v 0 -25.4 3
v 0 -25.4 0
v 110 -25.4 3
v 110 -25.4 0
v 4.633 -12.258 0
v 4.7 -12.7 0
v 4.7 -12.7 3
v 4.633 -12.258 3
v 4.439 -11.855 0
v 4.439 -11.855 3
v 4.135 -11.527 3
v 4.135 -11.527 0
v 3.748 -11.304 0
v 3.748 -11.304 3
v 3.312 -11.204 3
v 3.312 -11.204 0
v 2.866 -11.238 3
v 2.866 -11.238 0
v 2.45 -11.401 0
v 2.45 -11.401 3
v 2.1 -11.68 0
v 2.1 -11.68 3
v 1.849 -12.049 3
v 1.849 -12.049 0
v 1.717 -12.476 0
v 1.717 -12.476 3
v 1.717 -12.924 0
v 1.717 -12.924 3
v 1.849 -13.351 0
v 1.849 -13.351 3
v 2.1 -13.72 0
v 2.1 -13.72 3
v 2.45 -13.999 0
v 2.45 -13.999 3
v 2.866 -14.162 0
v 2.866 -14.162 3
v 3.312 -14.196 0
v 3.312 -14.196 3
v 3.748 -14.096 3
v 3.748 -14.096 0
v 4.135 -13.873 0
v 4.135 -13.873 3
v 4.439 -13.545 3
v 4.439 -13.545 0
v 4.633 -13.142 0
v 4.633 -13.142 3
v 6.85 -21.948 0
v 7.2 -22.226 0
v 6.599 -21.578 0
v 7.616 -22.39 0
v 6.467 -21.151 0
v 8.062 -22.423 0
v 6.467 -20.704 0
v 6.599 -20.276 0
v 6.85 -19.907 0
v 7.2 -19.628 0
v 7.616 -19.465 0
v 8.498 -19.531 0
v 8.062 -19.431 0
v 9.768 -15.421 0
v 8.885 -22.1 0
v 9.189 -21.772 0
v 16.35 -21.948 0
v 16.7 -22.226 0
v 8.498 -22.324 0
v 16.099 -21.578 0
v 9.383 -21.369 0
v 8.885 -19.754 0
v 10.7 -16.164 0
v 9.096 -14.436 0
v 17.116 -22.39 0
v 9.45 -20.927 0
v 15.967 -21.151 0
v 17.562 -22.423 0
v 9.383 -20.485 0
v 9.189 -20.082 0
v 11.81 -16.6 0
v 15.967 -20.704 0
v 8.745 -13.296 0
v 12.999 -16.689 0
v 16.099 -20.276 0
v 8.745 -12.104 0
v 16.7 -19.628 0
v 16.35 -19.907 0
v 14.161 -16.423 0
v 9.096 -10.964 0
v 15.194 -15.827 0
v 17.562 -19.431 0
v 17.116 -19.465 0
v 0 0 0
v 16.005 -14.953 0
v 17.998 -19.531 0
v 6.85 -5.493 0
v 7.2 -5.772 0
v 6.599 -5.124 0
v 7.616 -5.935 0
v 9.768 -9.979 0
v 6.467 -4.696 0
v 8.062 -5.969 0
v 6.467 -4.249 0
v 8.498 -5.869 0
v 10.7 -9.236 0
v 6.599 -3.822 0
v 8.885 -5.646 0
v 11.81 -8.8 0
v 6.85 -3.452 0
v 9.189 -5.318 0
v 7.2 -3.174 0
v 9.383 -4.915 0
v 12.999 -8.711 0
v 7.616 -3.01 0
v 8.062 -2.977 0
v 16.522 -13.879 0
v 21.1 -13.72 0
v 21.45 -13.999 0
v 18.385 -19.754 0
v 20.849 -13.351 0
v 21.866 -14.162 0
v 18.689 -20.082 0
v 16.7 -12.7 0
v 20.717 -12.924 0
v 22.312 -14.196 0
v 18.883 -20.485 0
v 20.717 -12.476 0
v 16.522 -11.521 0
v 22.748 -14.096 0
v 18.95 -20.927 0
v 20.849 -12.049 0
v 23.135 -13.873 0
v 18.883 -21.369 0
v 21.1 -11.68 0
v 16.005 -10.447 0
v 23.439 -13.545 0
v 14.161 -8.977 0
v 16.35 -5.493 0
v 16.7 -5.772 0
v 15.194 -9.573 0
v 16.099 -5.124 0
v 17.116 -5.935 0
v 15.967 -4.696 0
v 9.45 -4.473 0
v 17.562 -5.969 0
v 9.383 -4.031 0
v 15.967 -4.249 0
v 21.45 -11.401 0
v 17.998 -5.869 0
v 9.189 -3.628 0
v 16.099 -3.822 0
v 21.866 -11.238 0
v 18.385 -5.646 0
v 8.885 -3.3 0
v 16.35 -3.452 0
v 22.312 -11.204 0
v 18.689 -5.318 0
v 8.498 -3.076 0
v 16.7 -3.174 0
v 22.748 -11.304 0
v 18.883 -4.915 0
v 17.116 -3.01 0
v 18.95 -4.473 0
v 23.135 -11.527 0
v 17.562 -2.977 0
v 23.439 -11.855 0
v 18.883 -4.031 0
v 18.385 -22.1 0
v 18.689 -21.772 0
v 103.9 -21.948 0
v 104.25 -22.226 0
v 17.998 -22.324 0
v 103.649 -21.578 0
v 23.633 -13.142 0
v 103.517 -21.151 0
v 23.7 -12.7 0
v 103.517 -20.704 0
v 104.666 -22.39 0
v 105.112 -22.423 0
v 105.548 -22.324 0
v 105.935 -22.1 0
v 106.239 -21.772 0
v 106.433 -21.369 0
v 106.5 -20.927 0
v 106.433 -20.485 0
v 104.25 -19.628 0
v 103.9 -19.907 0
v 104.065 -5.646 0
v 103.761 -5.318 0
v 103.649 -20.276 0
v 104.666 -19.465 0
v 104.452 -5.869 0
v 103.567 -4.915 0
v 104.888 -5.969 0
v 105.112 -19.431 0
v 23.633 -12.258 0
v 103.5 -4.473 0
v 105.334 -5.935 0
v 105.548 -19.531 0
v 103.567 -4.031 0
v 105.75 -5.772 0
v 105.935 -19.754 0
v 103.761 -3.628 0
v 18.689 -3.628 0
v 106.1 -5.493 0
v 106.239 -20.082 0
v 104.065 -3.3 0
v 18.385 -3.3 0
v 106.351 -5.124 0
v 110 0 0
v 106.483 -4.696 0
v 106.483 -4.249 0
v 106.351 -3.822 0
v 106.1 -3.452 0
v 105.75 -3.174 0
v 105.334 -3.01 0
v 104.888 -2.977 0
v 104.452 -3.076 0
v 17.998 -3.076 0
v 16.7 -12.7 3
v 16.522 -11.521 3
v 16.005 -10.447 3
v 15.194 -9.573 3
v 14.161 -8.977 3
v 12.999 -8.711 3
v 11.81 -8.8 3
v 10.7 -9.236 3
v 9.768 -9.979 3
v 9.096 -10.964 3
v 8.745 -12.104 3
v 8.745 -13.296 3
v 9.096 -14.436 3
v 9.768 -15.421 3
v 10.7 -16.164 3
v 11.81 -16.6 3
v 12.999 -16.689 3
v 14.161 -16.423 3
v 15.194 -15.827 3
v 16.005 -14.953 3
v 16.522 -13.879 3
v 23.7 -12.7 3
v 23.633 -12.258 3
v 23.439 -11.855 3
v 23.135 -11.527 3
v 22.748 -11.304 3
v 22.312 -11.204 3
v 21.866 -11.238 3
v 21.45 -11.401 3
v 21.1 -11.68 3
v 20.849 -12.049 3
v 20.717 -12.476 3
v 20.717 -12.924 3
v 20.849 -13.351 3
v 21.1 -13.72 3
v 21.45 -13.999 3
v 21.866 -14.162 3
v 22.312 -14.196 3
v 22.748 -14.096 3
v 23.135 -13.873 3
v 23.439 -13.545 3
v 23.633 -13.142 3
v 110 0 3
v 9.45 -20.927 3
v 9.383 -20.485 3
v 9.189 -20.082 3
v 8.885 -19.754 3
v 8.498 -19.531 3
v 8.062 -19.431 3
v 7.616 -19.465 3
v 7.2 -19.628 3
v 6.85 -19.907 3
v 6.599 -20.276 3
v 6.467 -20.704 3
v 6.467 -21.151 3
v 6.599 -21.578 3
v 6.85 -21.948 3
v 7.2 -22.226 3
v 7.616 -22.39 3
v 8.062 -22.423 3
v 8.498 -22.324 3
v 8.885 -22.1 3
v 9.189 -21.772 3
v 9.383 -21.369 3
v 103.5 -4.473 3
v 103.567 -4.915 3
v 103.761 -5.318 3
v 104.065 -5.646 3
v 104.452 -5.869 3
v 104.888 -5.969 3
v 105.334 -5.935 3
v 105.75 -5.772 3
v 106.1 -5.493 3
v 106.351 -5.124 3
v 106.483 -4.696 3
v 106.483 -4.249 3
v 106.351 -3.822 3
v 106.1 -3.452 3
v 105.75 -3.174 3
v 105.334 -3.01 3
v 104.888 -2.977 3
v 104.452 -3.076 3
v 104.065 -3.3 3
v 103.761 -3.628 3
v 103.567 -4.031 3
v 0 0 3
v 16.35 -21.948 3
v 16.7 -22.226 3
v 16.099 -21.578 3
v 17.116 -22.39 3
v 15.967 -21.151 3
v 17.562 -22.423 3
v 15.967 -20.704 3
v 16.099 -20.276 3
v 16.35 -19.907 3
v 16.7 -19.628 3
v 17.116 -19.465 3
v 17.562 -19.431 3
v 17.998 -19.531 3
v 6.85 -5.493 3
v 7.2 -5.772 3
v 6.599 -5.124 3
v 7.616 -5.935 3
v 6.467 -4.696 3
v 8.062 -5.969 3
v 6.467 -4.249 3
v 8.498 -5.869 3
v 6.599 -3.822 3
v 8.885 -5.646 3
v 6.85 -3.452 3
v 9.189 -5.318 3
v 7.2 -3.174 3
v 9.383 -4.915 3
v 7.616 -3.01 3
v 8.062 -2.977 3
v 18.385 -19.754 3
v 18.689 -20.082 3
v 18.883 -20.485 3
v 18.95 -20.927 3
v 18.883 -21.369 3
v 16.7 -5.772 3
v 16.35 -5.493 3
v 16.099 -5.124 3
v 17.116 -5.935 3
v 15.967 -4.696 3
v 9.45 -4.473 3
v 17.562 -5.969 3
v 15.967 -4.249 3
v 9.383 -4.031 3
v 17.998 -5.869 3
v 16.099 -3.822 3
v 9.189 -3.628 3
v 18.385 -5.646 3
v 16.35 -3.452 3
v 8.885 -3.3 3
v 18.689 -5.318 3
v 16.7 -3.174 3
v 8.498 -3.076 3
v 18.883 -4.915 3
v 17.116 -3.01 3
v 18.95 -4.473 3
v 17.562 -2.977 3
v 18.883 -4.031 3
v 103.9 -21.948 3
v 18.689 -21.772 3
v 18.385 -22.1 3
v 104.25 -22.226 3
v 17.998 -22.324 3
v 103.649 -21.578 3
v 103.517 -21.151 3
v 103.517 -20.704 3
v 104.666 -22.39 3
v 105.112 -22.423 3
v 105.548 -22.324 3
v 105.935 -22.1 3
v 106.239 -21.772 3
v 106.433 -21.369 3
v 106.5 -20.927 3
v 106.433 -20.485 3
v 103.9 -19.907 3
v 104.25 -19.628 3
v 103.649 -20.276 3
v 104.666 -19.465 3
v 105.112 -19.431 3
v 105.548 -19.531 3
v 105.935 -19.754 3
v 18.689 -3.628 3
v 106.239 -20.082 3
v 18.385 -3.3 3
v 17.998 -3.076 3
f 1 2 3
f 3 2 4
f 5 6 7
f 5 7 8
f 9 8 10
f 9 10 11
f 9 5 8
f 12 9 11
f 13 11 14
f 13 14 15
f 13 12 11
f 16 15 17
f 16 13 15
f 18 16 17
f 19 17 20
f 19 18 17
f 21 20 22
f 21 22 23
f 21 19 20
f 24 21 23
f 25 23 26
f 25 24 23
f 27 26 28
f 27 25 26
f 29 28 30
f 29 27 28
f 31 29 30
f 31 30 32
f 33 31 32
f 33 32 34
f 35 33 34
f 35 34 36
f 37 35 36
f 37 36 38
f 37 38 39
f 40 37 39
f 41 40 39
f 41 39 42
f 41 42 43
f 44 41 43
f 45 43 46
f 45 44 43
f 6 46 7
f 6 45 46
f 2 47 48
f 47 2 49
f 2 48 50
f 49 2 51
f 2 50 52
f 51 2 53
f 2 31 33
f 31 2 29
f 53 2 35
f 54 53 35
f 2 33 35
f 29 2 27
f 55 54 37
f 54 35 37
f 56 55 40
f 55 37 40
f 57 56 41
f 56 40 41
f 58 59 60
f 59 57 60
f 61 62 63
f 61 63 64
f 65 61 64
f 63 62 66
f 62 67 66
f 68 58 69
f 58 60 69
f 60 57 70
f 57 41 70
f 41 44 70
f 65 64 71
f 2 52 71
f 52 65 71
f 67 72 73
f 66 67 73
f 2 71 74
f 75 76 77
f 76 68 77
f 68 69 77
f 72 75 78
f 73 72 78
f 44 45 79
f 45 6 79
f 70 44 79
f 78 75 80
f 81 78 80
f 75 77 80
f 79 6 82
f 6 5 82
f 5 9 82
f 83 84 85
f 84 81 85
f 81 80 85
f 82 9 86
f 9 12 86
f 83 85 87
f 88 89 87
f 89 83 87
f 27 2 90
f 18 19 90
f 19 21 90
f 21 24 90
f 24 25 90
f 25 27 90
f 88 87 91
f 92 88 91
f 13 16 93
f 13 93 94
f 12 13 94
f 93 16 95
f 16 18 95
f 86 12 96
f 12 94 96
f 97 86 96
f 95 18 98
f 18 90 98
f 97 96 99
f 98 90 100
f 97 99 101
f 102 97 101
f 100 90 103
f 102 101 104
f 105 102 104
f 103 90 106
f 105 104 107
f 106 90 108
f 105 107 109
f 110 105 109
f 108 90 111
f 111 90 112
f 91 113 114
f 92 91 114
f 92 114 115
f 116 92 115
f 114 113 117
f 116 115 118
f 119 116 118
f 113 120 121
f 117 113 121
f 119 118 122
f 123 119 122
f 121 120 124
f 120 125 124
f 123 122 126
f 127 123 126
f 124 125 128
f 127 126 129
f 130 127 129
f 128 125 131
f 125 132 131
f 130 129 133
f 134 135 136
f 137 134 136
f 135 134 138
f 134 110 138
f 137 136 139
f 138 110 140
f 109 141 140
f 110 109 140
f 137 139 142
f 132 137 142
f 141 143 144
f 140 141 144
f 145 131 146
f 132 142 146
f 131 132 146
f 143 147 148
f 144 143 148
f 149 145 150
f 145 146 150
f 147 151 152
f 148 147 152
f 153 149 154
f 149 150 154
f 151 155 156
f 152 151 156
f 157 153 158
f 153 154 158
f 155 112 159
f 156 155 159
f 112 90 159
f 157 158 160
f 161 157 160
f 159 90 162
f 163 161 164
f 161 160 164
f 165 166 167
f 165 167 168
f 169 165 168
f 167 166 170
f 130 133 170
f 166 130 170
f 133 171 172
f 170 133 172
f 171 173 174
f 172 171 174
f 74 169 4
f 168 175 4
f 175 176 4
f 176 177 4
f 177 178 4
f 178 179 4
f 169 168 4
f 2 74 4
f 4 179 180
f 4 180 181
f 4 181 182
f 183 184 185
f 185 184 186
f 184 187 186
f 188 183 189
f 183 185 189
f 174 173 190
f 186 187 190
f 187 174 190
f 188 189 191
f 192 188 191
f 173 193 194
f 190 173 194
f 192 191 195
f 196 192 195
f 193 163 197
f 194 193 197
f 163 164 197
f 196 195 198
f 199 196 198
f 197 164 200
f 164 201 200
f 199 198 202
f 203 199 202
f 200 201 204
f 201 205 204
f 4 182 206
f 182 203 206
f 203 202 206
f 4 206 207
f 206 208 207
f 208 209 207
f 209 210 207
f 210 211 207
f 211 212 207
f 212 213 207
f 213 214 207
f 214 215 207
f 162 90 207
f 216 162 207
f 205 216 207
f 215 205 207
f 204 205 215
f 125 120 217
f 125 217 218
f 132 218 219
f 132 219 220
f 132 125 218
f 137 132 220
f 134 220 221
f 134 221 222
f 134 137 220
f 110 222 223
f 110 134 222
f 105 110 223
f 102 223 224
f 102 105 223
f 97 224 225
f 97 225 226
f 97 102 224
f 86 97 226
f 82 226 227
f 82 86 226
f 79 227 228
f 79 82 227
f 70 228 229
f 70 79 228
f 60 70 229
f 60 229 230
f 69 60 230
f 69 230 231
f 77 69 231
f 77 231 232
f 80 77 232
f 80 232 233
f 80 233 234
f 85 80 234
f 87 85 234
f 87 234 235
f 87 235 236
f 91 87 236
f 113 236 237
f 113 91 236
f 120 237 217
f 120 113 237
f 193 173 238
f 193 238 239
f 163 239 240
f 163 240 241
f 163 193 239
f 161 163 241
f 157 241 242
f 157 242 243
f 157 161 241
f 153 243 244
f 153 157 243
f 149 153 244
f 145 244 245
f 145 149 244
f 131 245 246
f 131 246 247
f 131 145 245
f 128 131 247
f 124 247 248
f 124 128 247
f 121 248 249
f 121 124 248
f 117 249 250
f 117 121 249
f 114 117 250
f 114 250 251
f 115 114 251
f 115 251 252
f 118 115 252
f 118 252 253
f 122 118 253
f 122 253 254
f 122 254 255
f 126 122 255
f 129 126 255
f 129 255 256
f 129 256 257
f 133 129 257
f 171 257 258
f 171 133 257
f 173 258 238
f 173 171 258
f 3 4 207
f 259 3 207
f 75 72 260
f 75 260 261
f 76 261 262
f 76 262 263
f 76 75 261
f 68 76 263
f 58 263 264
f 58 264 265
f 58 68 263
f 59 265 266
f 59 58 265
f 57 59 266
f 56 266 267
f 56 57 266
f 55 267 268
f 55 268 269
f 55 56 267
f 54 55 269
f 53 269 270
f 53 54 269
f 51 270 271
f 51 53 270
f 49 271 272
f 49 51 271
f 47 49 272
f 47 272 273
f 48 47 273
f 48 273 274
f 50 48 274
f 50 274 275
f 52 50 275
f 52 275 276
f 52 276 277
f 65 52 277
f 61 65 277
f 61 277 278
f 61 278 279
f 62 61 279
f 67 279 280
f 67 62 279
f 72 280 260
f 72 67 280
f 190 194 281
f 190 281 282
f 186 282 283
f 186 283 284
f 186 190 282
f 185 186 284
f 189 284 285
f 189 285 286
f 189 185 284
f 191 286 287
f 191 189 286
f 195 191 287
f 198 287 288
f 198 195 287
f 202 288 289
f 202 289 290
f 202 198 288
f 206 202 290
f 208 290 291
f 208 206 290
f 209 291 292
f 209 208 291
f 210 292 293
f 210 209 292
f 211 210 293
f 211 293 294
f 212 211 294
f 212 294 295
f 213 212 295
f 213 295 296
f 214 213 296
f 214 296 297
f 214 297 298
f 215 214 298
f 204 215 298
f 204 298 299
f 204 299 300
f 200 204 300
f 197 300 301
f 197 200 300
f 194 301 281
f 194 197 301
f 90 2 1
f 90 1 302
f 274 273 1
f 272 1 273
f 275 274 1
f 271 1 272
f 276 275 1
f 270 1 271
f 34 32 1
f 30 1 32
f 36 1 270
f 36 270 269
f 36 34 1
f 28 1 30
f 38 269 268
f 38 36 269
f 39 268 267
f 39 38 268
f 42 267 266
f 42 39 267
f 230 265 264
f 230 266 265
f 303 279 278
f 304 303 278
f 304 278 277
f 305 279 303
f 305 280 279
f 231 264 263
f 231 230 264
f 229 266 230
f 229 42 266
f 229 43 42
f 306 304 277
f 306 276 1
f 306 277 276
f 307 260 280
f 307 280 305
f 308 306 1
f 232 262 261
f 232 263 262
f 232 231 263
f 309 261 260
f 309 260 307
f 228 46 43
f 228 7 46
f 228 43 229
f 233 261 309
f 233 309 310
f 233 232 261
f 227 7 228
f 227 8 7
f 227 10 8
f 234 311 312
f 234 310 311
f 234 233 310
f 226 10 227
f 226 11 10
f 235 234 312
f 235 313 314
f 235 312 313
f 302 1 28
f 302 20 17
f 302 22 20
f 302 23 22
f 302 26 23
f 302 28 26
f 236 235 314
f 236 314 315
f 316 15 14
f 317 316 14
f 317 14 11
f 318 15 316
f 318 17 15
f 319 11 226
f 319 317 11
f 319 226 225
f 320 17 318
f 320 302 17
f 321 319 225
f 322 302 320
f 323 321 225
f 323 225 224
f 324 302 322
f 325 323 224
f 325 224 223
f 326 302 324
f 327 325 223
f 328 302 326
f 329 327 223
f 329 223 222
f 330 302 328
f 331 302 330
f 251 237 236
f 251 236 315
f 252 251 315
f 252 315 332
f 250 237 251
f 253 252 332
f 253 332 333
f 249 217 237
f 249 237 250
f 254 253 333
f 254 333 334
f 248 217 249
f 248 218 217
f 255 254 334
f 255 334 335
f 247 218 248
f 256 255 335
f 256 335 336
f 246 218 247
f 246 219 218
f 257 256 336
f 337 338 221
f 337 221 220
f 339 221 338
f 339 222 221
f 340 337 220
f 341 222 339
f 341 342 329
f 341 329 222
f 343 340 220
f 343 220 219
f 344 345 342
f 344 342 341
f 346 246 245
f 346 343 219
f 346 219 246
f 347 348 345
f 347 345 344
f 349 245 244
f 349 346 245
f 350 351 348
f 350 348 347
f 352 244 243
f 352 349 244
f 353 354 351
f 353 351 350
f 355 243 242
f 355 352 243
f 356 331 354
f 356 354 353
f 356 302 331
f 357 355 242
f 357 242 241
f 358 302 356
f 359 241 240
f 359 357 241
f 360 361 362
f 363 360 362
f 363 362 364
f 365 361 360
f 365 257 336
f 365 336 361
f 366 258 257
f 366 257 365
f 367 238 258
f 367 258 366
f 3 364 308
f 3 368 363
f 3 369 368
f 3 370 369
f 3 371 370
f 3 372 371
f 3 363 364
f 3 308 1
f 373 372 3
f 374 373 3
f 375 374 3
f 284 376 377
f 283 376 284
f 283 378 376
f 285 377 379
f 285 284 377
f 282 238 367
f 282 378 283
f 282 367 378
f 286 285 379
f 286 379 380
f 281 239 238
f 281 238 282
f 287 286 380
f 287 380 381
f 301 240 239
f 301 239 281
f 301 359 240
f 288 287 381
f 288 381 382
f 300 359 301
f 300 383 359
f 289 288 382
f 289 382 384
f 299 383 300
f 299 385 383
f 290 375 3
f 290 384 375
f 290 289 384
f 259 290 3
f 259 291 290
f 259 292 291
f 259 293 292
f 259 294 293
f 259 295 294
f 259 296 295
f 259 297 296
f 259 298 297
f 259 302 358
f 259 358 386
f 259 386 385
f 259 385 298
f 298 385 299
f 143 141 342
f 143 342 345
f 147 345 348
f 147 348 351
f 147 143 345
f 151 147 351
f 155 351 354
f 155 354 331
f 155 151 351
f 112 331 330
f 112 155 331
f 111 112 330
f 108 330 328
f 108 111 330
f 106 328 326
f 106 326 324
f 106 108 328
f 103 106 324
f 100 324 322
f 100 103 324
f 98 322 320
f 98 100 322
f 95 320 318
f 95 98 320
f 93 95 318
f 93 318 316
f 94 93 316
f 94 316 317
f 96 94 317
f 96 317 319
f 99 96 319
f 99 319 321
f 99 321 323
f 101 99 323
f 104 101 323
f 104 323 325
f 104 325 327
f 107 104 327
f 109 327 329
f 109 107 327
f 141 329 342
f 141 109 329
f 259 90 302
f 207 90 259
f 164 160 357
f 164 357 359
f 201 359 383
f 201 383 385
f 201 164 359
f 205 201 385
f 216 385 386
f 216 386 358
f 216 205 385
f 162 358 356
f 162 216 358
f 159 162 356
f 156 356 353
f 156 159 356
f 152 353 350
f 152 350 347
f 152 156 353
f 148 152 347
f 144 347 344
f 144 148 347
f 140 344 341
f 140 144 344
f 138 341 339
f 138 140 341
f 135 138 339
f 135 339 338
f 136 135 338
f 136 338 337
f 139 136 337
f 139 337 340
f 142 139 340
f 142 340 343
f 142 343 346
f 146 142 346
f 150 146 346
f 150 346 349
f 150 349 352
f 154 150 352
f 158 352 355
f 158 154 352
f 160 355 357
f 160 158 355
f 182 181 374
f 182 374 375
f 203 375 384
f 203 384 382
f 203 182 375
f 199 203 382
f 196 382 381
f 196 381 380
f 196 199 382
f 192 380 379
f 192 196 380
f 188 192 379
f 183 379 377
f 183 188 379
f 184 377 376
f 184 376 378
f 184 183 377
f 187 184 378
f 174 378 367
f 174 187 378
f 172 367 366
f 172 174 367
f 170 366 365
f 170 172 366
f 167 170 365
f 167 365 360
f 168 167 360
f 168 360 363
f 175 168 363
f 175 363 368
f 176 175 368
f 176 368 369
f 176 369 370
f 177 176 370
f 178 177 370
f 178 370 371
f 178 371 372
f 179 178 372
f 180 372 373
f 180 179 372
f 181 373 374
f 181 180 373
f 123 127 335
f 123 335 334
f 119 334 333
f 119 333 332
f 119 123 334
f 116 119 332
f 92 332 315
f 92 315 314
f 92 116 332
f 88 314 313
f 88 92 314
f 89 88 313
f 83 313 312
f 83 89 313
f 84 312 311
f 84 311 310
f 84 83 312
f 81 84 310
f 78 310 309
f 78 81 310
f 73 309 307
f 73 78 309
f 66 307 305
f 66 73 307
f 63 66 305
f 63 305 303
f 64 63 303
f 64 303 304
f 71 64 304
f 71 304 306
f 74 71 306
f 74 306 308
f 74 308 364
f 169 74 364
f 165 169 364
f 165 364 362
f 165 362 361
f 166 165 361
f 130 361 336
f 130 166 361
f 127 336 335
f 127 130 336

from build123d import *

# Parameters (mm, degrees)
SKETCH1_W           = 110
SKETCH1_H           = 25.4
SKETCH1_R           = 1.5
SKETCH1_R_2         = 4
BOSS_EXTRUDE1_DEPTH = 3


with BuildPart() as part:
    # Sketch1 → Boss-Extrude1 (new body)
    with BuildSketch(Plane.XY):
        with Locations((55, -12.7)):
            Rectangle(SKETCH1_W, SKETCH1_H)
        with Locations((3.2, -12.7)):
            Circle(SKETCH1_R, mode=Mode.SUBTRACT)
        with Locations((7.95, -4.472758664)):
            Circle(SKETCH1_R, mode=Mode.SUBTRACT)
        with Locations((17.45, -4.472758664)):
            Circle(SKETCH1_R, mode=Mode.SUBTRACT)
        with Locations((22.2, -12.7)):
            Circle(SKETCH1_R, mode=Mode.SUBTRACT)
        with Locations((17.45, -20.927241336)):
            Circle(SKETCH1_R, mode=Mode.SUBTRACT)
        with Locations((7.95, -20.927241336)):
            Circle(SKETCH1_R, mode=Mode.SUBTRACT)
        with Locations((12.7, -12.7)):
            Circle(SKETCH1_R_2, mode=Mode.SUBTRACT)
        with Locations(Location((105, -4.472758664, 0), (0, 0, 180))):
            Circle(SKETCH1_R, mode=Mode.SUBTRACT)
        with Locations((105, -20.927241336)):
            Circle(SKETCH1_R, mode=Mode.SUBTRACT)
    extrude(amount=BOSS_EXTRUDE1_DEPTH)


solid = part.part
